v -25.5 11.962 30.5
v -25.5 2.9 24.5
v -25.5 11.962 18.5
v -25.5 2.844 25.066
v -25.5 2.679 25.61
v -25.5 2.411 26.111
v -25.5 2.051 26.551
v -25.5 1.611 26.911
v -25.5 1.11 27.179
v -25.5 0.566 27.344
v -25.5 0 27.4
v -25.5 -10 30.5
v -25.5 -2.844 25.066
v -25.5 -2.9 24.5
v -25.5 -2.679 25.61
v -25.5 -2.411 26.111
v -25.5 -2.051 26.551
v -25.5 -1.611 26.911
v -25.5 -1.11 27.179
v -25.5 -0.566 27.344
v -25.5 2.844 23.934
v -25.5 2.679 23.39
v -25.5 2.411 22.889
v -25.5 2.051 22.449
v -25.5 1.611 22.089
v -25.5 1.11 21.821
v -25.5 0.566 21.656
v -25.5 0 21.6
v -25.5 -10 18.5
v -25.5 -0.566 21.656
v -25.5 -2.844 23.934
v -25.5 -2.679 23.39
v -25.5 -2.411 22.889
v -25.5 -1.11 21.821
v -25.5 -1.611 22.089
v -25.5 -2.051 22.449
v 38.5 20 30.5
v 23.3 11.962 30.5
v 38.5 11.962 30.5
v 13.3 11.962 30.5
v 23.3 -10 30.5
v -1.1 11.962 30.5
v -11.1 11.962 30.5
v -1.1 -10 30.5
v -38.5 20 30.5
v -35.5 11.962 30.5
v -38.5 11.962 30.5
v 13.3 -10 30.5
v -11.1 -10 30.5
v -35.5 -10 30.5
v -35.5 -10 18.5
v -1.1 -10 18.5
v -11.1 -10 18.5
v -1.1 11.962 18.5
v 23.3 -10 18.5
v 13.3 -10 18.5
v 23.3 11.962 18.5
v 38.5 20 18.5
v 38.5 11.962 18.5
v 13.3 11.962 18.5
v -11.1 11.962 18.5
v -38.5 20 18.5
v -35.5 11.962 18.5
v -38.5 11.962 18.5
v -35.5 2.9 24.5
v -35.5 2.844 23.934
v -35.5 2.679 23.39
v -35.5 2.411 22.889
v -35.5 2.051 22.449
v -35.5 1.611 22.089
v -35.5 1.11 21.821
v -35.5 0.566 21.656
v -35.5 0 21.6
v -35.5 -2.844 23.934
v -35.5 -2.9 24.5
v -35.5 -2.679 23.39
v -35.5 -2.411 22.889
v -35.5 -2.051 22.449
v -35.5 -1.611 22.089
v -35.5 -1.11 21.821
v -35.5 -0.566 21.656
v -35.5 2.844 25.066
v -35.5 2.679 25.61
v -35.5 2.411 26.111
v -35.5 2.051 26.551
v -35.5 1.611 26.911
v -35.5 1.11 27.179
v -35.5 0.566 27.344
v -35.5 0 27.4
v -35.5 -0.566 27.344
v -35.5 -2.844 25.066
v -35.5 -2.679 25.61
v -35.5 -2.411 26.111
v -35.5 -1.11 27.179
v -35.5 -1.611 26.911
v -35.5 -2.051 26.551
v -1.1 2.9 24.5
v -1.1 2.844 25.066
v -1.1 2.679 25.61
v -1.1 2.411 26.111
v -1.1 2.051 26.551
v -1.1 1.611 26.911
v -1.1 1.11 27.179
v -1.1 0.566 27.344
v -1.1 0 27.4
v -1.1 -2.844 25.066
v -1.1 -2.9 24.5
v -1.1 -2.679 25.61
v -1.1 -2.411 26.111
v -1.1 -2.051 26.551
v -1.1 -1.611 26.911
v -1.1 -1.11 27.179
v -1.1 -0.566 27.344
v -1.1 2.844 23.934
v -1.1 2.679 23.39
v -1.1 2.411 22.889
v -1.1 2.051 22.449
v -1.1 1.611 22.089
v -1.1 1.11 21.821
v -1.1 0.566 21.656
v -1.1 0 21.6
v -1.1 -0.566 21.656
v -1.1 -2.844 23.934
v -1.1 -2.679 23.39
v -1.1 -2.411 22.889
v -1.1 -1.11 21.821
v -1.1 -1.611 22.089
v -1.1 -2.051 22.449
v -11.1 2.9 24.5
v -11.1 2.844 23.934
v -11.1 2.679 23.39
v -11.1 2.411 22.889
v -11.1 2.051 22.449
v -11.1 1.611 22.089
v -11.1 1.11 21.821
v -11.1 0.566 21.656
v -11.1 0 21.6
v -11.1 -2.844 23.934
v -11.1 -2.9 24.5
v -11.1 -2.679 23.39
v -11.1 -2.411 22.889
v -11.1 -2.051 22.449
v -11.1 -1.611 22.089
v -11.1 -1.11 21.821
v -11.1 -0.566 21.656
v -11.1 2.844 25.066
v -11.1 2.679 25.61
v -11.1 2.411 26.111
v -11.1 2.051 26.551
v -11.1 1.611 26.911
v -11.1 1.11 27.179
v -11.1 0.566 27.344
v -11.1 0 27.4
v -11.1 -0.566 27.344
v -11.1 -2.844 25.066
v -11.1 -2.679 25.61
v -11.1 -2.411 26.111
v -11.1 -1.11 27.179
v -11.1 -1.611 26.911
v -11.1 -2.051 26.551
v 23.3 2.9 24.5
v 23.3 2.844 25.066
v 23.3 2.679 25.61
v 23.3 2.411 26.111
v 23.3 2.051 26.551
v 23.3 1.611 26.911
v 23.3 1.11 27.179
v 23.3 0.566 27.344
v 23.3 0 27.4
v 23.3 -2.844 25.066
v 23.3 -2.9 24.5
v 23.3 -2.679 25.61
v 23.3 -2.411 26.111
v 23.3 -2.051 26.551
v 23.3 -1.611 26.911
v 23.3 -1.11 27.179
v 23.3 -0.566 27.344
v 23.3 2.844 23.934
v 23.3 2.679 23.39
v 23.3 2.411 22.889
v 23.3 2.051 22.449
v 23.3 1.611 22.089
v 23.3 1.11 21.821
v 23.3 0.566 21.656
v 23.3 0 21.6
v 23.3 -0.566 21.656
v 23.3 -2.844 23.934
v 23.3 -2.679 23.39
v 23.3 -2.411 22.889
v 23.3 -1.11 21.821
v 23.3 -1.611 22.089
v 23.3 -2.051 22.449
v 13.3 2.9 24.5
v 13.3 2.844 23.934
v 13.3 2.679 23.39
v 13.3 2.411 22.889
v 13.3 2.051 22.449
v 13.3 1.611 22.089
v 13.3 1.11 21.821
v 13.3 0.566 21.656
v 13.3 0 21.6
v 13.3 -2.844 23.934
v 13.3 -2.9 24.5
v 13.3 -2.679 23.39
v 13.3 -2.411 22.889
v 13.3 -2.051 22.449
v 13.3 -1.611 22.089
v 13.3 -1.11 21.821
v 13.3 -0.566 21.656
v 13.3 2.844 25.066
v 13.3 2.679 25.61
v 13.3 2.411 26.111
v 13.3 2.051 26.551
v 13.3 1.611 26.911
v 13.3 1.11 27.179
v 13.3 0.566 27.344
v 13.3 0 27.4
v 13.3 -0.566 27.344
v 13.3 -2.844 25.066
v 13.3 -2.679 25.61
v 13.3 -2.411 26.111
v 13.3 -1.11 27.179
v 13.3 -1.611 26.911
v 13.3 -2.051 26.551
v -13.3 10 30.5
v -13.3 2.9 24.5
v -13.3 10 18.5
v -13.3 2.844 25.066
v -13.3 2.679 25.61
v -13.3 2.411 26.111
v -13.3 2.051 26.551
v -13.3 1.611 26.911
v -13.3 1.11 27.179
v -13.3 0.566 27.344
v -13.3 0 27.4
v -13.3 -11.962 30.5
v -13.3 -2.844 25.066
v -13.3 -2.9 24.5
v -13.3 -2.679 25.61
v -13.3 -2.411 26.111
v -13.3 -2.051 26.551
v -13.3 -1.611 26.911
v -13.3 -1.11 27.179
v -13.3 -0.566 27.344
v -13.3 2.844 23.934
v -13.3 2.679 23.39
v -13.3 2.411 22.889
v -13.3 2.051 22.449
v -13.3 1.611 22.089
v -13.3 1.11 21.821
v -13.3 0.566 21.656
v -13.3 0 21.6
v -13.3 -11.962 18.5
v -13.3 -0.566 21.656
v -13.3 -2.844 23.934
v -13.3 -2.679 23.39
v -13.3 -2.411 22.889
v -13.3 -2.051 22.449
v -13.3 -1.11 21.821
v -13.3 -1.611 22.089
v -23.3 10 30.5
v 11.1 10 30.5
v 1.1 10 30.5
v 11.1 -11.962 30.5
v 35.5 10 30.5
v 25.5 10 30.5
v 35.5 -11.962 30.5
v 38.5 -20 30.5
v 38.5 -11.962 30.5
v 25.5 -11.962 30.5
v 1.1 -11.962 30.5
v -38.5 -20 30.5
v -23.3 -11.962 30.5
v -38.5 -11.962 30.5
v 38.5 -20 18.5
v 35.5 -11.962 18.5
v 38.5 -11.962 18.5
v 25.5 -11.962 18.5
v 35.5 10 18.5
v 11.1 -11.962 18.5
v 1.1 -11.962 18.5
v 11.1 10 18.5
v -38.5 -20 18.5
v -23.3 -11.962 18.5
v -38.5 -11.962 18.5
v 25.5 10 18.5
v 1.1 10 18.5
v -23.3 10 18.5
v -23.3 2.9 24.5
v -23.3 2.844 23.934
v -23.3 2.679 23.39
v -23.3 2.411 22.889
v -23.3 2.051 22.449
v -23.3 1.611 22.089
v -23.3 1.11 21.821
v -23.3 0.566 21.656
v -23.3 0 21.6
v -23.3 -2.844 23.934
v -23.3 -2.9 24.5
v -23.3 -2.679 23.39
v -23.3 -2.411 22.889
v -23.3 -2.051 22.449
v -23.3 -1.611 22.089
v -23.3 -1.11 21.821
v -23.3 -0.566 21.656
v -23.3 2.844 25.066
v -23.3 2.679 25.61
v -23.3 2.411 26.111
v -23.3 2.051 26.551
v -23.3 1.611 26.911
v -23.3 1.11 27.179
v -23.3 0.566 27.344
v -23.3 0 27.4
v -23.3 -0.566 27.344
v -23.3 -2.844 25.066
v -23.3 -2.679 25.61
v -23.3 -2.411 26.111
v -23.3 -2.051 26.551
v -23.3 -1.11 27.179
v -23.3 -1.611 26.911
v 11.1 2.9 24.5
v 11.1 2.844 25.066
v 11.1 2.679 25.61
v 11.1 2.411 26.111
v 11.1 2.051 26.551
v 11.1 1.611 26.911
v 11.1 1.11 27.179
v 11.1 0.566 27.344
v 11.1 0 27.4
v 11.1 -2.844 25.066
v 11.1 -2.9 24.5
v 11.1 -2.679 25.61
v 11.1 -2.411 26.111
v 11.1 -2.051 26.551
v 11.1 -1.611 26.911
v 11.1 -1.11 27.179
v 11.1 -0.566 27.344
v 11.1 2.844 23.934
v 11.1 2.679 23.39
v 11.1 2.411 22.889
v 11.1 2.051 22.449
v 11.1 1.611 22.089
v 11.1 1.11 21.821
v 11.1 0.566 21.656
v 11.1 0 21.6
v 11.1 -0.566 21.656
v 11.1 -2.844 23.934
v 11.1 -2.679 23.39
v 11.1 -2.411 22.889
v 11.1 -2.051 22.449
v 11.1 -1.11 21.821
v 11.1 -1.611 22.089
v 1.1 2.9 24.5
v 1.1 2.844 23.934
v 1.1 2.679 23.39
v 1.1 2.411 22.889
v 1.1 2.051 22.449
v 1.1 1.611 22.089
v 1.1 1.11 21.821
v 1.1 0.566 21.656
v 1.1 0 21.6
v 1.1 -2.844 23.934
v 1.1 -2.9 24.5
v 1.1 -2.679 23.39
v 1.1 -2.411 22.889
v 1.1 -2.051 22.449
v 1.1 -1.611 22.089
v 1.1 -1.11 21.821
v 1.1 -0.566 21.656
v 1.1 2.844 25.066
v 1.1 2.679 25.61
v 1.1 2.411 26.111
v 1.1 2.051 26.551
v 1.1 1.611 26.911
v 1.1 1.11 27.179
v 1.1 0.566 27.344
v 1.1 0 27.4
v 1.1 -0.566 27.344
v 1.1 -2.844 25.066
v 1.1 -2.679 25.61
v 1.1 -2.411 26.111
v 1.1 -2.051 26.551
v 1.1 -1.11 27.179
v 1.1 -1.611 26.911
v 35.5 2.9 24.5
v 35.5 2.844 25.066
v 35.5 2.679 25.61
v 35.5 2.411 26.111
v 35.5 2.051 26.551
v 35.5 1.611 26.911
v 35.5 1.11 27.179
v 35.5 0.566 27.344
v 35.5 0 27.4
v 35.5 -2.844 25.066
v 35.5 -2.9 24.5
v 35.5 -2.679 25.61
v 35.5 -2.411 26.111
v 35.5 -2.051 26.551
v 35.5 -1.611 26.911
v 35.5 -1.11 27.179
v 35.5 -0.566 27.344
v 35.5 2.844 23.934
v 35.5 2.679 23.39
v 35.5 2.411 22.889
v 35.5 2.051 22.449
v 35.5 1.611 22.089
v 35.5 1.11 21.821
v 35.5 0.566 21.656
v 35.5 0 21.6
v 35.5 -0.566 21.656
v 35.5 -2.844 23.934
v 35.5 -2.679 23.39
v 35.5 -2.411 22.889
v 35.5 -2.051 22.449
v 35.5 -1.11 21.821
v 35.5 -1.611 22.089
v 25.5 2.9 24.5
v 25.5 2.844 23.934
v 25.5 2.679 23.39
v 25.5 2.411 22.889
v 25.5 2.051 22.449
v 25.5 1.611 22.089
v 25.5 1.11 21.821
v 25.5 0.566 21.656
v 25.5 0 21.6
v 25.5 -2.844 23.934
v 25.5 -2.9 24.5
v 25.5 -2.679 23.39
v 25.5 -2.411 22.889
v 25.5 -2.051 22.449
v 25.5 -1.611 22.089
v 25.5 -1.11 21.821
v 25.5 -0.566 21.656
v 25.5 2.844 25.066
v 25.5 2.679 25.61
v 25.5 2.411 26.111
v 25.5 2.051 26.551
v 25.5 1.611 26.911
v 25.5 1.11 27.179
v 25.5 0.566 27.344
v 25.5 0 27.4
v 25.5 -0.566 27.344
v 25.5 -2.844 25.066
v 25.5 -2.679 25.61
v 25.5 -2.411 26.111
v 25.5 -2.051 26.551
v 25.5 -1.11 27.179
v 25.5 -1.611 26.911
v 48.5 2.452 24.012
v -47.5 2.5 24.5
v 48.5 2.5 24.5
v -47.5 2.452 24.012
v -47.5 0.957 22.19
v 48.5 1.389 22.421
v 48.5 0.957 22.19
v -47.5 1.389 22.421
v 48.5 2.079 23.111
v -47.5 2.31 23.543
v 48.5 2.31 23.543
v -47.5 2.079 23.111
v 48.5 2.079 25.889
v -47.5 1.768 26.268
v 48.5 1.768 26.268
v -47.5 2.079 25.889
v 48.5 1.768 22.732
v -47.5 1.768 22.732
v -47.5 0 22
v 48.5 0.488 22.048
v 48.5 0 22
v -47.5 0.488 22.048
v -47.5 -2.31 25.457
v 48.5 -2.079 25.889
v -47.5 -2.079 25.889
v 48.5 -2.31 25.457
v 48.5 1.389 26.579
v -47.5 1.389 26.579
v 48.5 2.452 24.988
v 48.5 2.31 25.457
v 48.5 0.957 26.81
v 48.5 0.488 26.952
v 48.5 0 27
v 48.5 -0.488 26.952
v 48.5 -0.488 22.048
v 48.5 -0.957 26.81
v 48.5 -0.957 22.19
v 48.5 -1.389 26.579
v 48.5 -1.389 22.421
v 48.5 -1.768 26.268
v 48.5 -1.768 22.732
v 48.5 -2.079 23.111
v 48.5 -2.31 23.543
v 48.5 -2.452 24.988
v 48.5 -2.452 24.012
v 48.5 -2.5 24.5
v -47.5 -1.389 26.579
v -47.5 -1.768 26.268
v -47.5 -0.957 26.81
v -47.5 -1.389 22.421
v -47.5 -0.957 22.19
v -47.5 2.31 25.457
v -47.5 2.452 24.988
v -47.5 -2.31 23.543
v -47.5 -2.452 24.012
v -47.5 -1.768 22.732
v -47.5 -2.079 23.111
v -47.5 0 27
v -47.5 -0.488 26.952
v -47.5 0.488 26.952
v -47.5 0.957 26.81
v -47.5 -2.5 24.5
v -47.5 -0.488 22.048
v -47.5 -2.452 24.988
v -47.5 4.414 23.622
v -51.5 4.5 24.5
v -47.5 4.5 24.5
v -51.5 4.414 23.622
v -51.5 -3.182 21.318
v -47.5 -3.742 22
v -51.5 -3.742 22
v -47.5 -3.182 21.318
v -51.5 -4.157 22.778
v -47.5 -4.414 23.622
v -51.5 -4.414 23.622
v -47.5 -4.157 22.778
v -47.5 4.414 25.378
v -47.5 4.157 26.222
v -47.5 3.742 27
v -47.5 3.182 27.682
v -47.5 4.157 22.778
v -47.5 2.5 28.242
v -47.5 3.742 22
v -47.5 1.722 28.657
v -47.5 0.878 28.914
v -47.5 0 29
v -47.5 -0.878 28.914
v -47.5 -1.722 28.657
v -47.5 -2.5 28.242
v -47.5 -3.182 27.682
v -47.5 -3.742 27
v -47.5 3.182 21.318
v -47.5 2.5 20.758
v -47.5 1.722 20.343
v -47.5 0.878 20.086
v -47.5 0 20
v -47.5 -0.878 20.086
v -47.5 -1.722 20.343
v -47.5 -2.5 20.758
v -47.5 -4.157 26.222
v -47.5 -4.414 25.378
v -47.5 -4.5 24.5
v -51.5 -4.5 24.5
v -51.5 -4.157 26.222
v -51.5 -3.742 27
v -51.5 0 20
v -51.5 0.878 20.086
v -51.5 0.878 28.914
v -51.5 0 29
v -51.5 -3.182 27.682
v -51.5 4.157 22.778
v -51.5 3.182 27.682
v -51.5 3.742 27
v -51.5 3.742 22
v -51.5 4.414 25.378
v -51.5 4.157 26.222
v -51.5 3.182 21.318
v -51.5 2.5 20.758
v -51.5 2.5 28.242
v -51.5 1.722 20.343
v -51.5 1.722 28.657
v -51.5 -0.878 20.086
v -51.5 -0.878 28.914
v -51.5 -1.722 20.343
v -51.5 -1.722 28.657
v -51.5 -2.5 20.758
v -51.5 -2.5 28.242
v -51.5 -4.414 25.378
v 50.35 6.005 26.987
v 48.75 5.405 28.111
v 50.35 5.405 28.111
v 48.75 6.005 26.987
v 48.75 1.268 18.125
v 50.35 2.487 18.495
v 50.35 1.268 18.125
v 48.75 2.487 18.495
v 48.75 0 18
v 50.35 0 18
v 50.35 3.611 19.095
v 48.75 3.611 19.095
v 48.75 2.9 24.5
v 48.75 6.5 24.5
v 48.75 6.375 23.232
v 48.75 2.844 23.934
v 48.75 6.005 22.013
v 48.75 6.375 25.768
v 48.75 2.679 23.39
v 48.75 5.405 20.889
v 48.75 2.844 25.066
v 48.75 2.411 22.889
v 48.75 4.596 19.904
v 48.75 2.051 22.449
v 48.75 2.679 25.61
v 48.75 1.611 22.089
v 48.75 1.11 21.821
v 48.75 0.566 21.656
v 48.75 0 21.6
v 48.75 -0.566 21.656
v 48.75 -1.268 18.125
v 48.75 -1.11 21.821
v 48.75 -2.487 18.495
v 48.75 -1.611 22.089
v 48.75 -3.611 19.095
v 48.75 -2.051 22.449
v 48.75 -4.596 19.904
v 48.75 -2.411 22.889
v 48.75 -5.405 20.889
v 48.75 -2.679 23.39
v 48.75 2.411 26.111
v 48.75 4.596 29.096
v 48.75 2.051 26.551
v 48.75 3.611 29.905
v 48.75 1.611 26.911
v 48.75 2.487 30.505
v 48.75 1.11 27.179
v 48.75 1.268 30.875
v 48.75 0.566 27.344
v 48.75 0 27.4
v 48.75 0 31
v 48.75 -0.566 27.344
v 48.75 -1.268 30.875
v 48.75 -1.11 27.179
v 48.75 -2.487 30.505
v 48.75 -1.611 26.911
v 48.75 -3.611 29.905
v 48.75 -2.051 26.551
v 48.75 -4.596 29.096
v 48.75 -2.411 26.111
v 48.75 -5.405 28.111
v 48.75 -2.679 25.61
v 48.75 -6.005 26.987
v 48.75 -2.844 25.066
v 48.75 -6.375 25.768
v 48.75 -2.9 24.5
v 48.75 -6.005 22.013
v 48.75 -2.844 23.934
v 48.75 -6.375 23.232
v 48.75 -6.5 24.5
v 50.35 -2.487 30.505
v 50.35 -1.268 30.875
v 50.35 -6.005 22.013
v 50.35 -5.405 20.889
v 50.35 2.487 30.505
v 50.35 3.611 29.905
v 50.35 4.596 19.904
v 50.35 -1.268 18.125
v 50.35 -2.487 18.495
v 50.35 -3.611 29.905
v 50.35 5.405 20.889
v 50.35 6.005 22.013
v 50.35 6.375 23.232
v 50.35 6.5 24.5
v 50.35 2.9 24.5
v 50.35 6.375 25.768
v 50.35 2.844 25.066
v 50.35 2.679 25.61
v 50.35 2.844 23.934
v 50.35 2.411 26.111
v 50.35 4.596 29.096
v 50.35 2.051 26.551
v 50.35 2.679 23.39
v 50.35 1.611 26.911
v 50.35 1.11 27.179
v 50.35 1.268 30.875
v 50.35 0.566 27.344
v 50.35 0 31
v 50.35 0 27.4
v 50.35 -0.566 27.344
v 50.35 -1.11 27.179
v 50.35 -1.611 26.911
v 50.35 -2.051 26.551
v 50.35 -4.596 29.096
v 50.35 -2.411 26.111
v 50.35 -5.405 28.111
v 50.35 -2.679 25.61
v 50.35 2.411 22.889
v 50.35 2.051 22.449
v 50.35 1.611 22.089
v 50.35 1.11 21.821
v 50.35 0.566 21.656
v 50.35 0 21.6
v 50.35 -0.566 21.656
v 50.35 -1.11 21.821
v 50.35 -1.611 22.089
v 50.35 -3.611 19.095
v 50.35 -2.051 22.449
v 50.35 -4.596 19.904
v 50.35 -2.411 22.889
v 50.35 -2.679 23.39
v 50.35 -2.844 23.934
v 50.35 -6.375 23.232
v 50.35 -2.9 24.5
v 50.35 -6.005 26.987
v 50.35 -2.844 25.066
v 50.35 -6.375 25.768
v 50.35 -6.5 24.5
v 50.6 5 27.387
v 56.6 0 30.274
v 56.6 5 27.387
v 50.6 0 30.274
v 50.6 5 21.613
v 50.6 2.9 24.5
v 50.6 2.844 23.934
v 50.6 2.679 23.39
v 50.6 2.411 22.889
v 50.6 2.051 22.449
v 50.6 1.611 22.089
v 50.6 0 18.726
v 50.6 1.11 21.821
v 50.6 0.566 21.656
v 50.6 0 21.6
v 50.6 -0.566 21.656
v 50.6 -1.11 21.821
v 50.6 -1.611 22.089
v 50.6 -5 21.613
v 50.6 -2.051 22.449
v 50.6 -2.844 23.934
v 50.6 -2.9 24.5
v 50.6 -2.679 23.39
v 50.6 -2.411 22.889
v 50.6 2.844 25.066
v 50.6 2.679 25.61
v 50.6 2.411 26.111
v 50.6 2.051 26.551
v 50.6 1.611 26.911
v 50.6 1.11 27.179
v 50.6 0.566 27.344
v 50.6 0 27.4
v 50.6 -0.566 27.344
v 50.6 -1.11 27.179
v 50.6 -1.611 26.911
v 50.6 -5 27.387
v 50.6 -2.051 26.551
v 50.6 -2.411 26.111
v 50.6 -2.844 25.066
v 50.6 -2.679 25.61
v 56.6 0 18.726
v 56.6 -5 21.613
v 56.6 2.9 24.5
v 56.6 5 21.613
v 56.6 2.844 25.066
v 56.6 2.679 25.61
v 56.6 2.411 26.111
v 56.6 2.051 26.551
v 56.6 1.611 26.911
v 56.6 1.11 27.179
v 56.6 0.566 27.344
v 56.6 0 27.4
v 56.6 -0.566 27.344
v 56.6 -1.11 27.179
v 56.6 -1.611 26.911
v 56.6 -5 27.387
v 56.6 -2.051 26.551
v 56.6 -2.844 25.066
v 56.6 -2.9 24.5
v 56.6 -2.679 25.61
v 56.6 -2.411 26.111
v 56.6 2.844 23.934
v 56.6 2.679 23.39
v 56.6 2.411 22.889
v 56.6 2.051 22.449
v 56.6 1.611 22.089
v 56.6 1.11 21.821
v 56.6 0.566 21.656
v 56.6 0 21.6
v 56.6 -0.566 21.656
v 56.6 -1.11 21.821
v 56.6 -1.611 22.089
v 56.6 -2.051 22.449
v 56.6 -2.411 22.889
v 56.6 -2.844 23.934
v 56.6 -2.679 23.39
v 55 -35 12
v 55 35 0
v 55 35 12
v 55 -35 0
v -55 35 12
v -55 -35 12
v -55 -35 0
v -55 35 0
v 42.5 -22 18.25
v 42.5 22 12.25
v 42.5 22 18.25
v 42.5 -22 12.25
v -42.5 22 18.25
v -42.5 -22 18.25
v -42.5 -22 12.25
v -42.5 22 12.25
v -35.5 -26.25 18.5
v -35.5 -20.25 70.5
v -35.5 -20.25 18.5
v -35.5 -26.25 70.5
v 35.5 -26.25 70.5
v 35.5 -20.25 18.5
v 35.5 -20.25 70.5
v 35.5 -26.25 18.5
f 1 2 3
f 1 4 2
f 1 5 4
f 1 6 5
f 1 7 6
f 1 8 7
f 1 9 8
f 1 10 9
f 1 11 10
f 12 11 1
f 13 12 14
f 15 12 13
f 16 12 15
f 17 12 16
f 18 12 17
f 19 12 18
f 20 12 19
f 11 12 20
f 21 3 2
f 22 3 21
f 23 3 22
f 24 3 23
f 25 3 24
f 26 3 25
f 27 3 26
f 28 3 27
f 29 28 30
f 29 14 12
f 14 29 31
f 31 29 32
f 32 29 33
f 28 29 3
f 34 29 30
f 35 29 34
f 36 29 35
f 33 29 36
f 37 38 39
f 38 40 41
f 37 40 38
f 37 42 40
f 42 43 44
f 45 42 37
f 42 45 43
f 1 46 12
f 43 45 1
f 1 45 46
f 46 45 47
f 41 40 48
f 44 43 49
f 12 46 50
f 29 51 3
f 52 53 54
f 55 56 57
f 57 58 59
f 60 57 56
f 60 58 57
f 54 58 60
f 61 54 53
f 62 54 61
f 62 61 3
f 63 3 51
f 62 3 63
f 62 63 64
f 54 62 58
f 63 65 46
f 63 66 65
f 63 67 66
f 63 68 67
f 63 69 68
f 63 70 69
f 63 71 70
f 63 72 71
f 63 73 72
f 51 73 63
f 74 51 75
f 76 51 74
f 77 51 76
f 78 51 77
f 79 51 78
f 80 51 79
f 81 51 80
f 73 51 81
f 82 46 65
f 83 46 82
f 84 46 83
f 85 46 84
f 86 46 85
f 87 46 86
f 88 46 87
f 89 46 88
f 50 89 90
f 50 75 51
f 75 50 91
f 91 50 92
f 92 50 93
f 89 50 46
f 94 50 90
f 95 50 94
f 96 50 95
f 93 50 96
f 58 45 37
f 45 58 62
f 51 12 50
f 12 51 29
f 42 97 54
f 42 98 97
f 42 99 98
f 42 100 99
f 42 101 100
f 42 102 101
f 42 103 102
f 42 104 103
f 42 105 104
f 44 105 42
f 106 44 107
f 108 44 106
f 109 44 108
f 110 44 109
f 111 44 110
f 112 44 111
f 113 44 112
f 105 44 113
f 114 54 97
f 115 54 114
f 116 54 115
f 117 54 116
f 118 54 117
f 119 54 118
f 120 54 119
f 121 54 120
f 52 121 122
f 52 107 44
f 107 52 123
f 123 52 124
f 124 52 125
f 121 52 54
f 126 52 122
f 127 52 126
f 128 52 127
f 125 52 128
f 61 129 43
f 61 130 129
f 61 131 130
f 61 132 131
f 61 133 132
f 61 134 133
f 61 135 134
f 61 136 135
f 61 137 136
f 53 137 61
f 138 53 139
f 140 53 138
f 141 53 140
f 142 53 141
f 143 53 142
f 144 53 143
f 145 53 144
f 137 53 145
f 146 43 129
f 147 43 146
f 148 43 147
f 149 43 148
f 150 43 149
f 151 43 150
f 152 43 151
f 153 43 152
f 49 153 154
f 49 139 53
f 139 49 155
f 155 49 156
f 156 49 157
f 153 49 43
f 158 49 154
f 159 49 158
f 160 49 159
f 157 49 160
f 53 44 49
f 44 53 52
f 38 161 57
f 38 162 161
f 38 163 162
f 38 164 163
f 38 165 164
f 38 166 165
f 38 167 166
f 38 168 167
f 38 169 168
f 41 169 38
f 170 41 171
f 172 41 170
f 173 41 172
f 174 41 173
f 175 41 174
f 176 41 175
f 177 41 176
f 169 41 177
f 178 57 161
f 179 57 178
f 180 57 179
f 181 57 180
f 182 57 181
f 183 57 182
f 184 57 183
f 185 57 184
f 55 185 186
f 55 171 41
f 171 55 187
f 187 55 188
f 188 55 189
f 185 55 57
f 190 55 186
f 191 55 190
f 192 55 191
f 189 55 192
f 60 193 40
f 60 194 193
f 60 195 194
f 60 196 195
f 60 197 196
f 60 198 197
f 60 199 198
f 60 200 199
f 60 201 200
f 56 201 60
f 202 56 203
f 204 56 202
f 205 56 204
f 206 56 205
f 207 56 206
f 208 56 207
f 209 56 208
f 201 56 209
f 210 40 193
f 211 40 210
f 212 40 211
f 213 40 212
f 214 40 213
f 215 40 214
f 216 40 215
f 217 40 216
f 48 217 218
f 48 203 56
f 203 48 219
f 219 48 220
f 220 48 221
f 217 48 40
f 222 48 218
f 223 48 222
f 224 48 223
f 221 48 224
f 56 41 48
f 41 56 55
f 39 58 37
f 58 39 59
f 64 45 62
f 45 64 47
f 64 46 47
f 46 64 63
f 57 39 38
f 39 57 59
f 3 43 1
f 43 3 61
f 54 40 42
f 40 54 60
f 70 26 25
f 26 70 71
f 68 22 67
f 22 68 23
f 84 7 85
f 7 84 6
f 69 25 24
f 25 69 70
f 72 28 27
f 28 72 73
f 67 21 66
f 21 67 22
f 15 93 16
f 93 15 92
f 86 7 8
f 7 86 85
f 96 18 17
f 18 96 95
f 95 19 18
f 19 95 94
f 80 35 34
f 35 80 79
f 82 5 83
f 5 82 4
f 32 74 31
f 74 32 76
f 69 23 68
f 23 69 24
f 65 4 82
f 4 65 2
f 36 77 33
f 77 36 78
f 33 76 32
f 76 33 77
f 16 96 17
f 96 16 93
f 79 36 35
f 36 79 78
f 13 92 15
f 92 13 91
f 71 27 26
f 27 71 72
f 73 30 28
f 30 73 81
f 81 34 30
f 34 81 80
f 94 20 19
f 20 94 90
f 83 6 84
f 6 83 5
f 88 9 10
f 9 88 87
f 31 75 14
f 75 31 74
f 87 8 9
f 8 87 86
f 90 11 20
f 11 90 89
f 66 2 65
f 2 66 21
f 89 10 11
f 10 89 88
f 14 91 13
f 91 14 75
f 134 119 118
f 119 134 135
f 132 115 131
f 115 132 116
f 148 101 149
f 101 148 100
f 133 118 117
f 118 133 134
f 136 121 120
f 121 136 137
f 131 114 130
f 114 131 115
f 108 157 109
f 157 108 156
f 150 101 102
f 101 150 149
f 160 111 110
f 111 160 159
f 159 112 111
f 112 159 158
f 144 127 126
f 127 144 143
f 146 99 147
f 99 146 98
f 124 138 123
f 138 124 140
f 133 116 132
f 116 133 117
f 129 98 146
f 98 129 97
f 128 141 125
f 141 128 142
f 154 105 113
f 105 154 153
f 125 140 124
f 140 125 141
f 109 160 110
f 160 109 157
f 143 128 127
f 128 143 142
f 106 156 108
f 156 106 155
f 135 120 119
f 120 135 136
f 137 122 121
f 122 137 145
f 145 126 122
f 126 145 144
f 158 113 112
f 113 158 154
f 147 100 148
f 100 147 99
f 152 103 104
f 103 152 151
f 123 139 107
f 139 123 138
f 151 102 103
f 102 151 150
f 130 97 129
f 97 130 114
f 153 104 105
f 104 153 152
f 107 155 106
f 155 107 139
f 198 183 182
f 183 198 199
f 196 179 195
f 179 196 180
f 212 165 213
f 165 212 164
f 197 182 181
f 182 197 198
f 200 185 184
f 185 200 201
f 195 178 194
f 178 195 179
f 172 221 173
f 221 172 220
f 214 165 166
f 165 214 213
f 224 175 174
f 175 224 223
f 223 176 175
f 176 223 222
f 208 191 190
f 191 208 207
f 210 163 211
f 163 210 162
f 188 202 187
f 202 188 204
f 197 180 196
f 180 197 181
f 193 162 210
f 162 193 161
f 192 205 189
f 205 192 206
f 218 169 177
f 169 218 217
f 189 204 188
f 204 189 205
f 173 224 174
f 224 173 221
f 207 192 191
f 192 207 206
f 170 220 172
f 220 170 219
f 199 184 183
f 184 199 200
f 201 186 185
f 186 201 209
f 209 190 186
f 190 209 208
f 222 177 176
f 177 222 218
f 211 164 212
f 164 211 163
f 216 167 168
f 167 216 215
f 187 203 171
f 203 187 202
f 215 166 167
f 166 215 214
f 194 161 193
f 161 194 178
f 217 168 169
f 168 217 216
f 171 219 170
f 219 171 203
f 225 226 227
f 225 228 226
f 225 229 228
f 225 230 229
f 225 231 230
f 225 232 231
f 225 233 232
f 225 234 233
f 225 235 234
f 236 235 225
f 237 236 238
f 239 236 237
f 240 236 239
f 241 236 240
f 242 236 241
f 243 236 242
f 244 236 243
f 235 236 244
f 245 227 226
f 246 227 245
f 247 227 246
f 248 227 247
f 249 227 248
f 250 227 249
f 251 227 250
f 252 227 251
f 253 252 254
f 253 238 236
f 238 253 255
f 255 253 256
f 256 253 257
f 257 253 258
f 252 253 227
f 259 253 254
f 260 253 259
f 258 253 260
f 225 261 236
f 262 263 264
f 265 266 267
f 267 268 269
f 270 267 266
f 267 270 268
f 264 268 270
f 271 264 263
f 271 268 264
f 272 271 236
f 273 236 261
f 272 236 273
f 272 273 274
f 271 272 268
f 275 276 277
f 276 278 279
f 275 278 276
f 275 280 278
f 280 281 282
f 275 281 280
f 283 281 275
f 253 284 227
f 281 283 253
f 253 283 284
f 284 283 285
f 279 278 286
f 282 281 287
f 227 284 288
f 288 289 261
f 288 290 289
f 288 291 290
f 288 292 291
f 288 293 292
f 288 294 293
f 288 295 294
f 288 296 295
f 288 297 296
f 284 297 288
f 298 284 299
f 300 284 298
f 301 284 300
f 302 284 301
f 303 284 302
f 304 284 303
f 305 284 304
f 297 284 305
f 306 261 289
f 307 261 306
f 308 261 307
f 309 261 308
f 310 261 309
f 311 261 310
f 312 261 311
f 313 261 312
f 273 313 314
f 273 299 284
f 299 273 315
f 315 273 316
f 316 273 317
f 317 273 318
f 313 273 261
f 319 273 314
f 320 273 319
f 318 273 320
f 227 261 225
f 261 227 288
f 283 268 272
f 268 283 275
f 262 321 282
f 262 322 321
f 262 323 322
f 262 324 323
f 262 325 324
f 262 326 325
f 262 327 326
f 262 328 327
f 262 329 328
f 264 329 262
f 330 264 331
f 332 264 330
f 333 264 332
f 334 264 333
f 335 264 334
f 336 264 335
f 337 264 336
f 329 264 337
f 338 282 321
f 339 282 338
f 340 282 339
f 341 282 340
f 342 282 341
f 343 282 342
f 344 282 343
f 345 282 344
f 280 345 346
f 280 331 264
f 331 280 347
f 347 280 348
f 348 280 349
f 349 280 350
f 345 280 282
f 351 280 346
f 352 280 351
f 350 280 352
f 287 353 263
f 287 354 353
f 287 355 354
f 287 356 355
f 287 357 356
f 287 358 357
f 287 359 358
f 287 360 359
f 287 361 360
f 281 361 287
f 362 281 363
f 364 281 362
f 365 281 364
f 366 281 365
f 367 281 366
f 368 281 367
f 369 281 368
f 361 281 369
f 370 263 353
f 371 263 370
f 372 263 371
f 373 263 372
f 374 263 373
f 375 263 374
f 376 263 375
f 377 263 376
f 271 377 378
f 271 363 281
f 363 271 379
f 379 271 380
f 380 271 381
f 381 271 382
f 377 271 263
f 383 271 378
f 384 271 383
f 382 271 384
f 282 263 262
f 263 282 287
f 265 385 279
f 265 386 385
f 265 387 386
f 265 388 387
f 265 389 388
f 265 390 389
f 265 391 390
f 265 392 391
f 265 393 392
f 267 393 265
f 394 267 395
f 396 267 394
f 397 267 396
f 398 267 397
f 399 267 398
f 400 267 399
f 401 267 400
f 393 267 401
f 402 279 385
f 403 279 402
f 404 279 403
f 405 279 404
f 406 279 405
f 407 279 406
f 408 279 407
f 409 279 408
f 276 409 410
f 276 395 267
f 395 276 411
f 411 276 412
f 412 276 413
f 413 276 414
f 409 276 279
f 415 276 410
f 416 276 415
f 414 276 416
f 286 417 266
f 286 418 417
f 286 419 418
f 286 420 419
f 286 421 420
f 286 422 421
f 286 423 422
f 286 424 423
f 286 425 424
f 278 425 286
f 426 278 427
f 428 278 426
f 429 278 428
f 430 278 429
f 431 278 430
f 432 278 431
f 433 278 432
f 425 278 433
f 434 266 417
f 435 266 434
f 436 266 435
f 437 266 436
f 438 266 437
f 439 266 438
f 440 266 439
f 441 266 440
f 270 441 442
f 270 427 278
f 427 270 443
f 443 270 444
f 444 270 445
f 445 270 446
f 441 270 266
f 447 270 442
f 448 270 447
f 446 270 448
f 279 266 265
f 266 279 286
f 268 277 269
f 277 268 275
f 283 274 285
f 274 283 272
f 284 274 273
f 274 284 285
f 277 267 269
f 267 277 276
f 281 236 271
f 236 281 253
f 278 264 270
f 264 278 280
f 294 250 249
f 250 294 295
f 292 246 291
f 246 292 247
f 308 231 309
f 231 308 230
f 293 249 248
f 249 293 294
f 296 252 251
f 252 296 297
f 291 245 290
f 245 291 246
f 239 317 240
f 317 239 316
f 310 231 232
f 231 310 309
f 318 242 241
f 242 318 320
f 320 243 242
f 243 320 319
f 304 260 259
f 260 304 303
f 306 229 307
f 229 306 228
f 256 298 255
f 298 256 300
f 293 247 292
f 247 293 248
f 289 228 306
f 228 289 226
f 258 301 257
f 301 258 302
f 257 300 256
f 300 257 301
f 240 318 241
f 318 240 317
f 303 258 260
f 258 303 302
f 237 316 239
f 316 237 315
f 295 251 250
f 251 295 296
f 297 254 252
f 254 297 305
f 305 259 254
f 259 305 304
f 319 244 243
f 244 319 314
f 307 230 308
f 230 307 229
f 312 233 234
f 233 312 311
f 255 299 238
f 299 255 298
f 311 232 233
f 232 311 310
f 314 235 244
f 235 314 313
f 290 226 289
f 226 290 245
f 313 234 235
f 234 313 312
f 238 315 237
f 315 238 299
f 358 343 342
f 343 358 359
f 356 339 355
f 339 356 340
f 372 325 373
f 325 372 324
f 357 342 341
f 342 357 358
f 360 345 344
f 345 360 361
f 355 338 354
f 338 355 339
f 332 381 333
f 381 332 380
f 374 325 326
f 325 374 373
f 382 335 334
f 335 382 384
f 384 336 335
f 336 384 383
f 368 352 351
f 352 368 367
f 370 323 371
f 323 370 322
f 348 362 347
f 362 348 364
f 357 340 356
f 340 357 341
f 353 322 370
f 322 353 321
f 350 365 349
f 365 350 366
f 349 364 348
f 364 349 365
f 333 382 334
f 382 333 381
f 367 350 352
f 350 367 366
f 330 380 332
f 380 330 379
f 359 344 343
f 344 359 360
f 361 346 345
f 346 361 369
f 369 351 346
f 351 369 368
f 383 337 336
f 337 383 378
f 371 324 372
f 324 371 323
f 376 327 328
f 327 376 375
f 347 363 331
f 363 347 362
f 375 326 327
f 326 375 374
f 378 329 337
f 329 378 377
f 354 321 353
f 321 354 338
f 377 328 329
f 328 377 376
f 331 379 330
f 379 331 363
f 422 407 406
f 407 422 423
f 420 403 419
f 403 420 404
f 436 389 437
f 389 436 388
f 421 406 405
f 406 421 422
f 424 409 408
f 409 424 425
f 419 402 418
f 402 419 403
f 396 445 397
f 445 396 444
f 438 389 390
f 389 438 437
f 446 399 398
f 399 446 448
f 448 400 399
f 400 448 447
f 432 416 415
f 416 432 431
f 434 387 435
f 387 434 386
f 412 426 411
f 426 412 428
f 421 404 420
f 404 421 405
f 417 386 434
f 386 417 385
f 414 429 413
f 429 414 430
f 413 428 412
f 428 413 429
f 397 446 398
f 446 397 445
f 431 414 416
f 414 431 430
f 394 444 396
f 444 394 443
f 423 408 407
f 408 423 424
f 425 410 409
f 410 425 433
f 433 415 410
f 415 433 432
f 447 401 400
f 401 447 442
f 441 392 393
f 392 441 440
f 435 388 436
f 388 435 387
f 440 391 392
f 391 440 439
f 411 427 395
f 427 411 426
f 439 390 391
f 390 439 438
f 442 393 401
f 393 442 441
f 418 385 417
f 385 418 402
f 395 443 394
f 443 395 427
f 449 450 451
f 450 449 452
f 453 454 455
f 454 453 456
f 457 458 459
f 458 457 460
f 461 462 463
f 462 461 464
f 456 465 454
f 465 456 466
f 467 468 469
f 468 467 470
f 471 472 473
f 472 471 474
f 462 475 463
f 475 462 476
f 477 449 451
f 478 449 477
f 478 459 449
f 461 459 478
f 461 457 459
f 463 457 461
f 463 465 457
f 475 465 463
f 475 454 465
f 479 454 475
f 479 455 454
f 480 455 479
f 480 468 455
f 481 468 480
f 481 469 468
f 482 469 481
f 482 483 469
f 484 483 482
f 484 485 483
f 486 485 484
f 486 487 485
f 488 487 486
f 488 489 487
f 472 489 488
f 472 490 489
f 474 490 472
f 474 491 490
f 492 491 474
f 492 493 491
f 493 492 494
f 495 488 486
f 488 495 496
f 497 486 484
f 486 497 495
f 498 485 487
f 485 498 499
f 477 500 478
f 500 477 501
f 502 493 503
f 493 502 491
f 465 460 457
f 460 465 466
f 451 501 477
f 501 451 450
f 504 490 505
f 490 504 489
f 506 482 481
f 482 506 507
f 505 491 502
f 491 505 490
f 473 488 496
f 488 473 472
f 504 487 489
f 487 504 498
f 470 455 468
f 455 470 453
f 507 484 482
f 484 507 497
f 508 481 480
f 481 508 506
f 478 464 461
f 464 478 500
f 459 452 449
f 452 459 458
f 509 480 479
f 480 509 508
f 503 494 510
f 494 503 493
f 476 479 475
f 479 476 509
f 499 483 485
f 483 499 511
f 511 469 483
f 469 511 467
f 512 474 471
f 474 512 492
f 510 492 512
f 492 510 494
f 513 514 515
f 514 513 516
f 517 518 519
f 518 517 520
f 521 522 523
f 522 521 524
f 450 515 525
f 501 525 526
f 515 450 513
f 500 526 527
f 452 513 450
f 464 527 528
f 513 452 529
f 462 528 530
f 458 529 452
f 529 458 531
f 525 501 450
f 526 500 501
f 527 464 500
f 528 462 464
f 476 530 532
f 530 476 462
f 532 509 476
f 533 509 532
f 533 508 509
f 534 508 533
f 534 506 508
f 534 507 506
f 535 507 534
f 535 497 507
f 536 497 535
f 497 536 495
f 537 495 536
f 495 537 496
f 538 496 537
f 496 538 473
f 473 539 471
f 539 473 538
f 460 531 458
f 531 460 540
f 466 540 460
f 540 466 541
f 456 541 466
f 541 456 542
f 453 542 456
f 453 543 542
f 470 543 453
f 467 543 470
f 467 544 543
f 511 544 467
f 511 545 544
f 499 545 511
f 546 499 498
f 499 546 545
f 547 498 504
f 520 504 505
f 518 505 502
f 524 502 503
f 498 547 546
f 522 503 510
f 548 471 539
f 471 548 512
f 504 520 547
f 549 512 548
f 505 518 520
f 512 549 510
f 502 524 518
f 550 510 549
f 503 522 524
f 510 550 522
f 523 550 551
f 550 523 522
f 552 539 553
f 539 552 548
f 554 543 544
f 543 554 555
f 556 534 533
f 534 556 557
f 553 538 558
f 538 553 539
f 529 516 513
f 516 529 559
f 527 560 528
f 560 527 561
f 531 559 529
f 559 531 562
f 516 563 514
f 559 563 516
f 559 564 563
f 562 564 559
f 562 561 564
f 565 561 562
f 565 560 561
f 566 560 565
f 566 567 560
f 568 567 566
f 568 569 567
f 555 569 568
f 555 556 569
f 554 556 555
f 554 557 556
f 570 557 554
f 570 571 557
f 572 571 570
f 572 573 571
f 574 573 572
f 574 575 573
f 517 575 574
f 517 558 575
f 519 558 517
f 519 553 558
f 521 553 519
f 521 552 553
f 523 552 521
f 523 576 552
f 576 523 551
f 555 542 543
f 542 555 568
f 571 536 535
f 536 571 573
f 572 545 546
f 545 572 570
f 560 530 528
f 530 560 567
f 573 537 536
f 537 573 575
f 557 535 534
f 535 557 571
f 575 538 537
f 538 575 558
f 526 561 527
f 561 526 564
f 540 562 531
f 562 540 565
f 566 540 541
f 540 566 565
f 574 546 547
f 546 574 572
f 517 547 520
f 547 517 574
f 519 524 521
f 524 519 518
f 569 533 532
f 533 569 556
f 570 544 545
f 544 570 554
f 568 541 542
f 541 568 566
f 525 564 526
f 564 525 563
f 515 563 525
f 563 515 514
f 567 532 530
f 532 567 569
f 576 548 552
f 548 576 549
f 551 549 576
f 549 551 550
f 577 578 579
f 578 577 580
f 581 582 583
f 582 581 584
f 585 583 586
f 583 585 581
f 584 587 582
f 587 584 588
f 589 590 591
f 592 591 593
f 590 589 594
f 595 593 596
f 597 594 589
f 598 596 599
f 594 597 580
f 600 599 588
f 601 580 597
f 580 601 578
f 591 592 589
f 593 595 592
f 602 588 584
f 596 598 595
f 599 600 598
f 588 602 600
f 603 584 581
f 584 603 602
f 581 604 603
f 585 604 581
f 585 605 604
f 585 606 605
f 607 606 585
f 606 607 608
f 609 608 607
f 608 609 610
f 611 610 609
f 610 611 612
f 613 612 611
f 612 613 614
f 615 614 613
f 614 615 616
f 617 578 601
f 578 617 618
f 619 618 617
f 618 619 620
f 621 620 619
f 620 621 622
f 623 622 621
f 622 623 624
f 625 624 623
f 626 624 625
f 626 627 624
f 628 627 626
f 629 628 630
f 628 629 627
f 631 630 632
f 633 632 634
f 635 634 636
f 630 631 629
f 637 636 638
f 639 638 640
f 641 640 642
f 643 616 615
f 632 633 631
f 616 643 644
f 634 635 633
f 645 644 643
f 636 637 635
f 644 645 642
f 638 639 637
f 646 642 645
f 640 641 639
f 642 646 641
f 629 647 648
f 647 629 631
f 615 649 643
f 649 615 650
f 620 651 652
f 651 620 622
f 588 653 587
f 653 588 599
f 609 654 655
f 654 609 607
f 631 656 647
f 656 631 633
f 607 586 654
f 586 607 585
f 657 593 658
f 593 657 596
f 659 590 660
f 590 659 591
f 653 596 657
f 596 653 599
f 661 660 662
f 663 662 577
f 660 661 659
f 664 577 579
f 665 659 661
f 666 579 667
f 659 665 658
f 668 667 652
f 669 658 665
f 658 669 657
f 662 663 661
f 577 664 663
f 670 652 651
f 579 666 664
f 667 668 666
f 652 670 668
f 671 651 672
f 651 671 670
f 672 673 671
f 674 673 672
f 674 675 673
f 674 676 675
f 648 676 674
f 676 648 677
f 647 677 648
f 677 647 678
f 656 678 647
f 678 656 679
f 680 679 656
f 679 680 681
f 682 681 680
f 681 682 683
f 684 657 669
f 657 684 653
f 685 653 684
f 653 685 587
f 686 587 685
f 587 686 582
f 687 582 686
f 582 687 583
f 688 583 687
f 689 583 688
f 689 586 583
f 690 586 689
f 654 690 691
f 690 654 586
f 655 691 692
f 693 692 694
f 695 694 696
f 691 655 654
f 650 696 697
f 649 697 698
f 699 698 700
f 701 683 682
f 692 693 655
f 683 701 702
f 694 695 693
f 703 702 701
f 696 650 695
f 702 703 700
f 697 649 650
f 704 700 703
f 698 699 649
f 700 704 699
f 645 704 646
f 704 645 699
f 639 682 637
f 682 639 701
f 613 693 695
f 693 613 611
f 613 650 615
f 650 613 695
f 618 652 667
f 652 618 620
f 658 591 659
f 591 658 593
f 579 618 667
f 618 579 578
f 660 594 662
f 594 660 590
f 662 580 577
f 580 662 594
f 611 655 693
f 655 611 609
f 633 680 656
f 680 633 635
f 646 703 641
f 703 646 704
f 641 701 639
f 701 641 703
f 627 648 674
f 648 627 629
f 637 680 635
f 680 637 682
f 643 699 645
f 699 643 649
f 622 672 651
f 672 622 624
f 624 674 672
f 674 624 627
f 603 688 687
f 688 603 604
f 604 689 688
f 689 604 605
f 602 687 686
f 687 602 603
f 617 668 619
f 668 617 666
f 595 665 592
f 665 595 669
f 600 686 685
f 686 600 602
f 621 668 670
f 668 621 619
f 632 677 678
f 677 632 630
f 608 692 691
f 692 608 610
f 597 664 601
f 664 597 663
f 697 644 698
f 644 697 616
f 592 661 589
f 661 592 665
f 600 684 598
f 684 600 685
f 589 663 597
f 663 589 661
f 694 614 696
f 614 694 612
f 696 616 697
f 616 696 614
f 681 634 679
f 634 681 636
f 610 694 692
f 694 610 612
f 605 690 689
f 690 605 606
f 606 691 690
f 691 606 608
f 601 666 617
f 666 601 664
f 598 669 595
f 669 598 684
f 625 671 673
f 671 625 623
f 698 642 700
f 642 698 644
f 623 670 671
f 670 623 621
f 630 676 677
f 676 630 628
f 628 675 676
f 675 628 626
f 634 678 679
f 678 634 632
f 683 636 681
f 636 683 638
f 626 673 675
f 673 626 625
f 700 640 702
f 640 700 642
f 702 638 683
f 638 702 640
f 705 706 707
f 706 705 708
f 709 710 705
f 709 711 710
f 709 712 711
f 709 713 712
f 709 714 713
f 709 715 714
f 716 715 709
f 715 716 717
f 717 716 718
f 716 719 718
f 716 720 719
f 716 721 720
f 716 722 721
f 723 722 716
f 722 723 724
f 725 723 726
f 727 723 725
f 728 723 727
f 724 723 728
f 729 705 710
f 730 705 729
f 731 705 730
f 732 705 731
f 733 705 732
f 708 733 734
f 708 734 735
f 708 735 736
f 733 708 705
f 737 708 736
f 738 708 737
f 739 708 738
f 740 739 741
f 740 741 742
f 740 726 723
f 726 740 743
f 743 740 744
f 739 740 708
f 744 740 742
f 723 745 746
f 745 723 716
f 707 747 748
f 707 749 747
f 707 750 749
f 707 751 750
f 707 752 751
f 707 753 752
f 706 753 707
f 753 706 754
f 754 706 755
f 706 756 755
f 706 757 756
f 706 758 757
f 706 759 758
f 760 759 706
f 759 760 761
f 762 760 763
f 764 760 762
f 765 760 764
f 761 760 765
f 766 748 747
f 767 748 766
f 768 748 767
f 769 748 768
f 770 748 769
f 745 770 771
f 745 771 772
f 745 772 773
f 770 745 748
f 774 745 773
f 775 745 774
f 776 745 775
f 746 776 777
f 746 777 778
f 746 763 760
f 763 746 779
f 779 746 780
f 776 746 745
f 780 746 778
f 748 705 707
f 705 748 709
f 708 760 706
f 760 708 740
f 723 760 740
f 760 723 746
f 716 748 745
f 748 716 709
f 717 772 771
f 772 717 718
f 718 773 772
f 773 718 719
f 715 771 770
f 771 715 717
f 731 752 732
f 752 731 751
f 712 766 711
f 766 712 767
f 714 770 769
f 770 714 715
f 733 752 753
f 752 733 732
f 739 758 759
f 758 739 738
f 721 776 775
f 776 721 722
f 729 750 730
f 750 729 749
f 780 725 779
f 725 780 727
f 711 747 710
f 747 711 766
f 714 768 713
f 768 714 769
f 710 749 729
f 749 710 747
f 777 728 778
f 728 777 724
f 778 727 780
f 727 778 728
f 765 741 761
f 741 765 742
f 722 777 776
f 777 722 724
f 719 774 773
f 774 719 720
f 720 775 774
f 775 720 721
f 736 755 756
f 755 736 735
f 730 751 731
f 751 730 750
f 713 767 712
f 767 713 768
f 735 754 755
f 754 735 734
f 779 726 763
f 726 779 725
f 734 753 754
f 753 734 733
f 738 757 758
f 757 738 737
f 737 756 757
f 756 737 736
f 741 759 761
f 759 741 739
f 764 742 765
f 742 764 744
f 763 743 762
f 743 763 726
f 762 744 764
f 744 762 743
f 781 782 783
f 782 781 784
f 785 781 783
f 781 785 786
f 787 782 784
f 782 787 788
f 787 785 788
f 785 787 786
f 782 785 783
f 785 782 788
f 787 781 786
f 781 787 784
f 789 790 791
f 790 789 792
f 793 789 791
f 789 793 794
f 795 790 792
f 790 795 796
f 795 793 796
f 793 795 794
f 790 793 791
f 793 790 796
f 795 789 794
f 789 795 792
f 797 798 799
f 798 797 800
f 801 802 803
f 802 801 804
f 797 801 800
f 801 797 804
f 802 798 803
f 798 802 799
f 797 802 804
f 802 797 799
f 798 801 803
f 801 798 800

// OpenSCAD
$fn = 32;

// ------------------------------------------------------------------------
// Comb hinge with flap: leaf 77 x 20 mm, pin d5, flap 52 mm
// Every part is its own module, assembly() places every instance.
// ------------------------------------------------------------------------

// --- part 1 ---
module hinge_bed() {
  difference() {
    translate([-55, -35, 0]) cube([110, 70, 12]);
  }
}

// --- part 2 ---
module hinge_riser() {
  difference() {
    translate([-42.5, -22, 0]) cube([85, 44, 6]);
  }
}

// --- part 3 ---
module hinge_leaf_a() {
  difference() {
    union() {
      translate([-35.5, -10, -6]) cube([10, 30, 12]);
      translate([-11.1, -10, -6]) cube([10, 30, 12]);
      translate([13.3, -10, -6]) cube([10, 30, 12]);
      translate([-38.5, 11.962, -6]) cube([77, 8.038, 12]);
    }
    translate([-30.5, 0, 0]) rotate([0, 90, 0]) cylinder(h = 12, d = 5.8, center = true);
    translate([-6.1, 0, 0]) rotate([0, 90, 0]) cylinder(h = 12, d = 5.8, center = true);
    translate([18.3, 0, 0]) rotate([0, 90, 0]) cylinder(h = 12, d = 5.8, center = true);
  }
}

// --- part 4 ---
module hinge_leaf_b() {
  difference() {
    union() {
      translate([-23.3, -20, -6]) cube([10, 30, 12]);
      translate([1.1, -20, -6]) cube([10, 30, 12]);
      translate([25.5, -20, -6]) cube([10, 30, 12]);
      translate([-38.5, -20, -6]) cube([77, 8.038, 12]);
    }
    translate([-18.3, 0, 0]) rotate([0, 90, 0]) cylinder(h = 12, d = 5.8, center = true);
    translate([6.1, 0, 0]) rotate([0, 90, 0]) cylinder(h = 12, d = 5.8, center = true);
    translate([30.5, 0, 0]) rotate([0, 90, 0]) cylinder(h = 12, d = 5.8, center = true);
  }
}

// --- part 5 ---
module hinge_flap() {
  difference() {
    translate([-35.5, -26, 0]) cube([71, 52, 6]);
  }
}

// --- part 6 ---
module hinge_pin() {
  rotate([0, 90, 0]) cylinder(h = 97, d = 5, center = true);
  translate([-51.5, 0, 0]) rotate([0, 90, 0]) cylinder(h = 4, d = 9);
}

// --- part 7 ---
module pin_washer() {
  difference() {
      translate([0, 0, 0]) cylinder(h = 1.6, d = 13);
      translate([0, 0, -1]) cylinder(h = 3.6, d = 5.8);
    }
}

// --- part 8 ---
module pin_nut() {
  difference() {
    linear_extrude(height = 6) polygon(points = [[5.774, 0], [2.887, 5], [-2.887, 5], [-5.774, 0], [-2.887, -5], [2.887, -5]]);
    translate([0, 0, -1]) cylinder(h = 8, d = 5.8);
  }
}

// --- assembly ---
module assembly() {
  color([0.80, 0.24, 0.20]) translate([0, 0, 0]) rotate([0, 0, 0]) hinge_bed();
  color([0.20, 0.45, 0.75]) translate([0, 0, 12.25]) rotate([0, 0, 0]) hinge_riser();
  color([0.25, 0.62, 0.32]) translate([0, 0, 24.5]) rotate([0, 0, 0]) hinge_leaf_a();
  color([0.92, 0.70, 0.18]) translate([0, 0, 24.5]) rotate([0, 0, 0]) hinge_leaf_b();
  color([0.58, 0.35, 0.70]) translate([0, -20.25, 44.5]) rotate([90, 0, 0]) hinge_flap();
  color([0.16, 0.66, 0.66]) translate([0, 0, 24.5]) rotate([0, 0, 0]) hinge_pin();
  color([0.85, 0.48, 0.18]) translate([48.75, 0, 24.5]) rotate([0, 90, 0]) pin_washer();
  color([0.55, 0.60, 0.65]) translate([50.6, 0, 24.5]) rotate([0, 90, 0]) pin_nut();
}

assembly();
